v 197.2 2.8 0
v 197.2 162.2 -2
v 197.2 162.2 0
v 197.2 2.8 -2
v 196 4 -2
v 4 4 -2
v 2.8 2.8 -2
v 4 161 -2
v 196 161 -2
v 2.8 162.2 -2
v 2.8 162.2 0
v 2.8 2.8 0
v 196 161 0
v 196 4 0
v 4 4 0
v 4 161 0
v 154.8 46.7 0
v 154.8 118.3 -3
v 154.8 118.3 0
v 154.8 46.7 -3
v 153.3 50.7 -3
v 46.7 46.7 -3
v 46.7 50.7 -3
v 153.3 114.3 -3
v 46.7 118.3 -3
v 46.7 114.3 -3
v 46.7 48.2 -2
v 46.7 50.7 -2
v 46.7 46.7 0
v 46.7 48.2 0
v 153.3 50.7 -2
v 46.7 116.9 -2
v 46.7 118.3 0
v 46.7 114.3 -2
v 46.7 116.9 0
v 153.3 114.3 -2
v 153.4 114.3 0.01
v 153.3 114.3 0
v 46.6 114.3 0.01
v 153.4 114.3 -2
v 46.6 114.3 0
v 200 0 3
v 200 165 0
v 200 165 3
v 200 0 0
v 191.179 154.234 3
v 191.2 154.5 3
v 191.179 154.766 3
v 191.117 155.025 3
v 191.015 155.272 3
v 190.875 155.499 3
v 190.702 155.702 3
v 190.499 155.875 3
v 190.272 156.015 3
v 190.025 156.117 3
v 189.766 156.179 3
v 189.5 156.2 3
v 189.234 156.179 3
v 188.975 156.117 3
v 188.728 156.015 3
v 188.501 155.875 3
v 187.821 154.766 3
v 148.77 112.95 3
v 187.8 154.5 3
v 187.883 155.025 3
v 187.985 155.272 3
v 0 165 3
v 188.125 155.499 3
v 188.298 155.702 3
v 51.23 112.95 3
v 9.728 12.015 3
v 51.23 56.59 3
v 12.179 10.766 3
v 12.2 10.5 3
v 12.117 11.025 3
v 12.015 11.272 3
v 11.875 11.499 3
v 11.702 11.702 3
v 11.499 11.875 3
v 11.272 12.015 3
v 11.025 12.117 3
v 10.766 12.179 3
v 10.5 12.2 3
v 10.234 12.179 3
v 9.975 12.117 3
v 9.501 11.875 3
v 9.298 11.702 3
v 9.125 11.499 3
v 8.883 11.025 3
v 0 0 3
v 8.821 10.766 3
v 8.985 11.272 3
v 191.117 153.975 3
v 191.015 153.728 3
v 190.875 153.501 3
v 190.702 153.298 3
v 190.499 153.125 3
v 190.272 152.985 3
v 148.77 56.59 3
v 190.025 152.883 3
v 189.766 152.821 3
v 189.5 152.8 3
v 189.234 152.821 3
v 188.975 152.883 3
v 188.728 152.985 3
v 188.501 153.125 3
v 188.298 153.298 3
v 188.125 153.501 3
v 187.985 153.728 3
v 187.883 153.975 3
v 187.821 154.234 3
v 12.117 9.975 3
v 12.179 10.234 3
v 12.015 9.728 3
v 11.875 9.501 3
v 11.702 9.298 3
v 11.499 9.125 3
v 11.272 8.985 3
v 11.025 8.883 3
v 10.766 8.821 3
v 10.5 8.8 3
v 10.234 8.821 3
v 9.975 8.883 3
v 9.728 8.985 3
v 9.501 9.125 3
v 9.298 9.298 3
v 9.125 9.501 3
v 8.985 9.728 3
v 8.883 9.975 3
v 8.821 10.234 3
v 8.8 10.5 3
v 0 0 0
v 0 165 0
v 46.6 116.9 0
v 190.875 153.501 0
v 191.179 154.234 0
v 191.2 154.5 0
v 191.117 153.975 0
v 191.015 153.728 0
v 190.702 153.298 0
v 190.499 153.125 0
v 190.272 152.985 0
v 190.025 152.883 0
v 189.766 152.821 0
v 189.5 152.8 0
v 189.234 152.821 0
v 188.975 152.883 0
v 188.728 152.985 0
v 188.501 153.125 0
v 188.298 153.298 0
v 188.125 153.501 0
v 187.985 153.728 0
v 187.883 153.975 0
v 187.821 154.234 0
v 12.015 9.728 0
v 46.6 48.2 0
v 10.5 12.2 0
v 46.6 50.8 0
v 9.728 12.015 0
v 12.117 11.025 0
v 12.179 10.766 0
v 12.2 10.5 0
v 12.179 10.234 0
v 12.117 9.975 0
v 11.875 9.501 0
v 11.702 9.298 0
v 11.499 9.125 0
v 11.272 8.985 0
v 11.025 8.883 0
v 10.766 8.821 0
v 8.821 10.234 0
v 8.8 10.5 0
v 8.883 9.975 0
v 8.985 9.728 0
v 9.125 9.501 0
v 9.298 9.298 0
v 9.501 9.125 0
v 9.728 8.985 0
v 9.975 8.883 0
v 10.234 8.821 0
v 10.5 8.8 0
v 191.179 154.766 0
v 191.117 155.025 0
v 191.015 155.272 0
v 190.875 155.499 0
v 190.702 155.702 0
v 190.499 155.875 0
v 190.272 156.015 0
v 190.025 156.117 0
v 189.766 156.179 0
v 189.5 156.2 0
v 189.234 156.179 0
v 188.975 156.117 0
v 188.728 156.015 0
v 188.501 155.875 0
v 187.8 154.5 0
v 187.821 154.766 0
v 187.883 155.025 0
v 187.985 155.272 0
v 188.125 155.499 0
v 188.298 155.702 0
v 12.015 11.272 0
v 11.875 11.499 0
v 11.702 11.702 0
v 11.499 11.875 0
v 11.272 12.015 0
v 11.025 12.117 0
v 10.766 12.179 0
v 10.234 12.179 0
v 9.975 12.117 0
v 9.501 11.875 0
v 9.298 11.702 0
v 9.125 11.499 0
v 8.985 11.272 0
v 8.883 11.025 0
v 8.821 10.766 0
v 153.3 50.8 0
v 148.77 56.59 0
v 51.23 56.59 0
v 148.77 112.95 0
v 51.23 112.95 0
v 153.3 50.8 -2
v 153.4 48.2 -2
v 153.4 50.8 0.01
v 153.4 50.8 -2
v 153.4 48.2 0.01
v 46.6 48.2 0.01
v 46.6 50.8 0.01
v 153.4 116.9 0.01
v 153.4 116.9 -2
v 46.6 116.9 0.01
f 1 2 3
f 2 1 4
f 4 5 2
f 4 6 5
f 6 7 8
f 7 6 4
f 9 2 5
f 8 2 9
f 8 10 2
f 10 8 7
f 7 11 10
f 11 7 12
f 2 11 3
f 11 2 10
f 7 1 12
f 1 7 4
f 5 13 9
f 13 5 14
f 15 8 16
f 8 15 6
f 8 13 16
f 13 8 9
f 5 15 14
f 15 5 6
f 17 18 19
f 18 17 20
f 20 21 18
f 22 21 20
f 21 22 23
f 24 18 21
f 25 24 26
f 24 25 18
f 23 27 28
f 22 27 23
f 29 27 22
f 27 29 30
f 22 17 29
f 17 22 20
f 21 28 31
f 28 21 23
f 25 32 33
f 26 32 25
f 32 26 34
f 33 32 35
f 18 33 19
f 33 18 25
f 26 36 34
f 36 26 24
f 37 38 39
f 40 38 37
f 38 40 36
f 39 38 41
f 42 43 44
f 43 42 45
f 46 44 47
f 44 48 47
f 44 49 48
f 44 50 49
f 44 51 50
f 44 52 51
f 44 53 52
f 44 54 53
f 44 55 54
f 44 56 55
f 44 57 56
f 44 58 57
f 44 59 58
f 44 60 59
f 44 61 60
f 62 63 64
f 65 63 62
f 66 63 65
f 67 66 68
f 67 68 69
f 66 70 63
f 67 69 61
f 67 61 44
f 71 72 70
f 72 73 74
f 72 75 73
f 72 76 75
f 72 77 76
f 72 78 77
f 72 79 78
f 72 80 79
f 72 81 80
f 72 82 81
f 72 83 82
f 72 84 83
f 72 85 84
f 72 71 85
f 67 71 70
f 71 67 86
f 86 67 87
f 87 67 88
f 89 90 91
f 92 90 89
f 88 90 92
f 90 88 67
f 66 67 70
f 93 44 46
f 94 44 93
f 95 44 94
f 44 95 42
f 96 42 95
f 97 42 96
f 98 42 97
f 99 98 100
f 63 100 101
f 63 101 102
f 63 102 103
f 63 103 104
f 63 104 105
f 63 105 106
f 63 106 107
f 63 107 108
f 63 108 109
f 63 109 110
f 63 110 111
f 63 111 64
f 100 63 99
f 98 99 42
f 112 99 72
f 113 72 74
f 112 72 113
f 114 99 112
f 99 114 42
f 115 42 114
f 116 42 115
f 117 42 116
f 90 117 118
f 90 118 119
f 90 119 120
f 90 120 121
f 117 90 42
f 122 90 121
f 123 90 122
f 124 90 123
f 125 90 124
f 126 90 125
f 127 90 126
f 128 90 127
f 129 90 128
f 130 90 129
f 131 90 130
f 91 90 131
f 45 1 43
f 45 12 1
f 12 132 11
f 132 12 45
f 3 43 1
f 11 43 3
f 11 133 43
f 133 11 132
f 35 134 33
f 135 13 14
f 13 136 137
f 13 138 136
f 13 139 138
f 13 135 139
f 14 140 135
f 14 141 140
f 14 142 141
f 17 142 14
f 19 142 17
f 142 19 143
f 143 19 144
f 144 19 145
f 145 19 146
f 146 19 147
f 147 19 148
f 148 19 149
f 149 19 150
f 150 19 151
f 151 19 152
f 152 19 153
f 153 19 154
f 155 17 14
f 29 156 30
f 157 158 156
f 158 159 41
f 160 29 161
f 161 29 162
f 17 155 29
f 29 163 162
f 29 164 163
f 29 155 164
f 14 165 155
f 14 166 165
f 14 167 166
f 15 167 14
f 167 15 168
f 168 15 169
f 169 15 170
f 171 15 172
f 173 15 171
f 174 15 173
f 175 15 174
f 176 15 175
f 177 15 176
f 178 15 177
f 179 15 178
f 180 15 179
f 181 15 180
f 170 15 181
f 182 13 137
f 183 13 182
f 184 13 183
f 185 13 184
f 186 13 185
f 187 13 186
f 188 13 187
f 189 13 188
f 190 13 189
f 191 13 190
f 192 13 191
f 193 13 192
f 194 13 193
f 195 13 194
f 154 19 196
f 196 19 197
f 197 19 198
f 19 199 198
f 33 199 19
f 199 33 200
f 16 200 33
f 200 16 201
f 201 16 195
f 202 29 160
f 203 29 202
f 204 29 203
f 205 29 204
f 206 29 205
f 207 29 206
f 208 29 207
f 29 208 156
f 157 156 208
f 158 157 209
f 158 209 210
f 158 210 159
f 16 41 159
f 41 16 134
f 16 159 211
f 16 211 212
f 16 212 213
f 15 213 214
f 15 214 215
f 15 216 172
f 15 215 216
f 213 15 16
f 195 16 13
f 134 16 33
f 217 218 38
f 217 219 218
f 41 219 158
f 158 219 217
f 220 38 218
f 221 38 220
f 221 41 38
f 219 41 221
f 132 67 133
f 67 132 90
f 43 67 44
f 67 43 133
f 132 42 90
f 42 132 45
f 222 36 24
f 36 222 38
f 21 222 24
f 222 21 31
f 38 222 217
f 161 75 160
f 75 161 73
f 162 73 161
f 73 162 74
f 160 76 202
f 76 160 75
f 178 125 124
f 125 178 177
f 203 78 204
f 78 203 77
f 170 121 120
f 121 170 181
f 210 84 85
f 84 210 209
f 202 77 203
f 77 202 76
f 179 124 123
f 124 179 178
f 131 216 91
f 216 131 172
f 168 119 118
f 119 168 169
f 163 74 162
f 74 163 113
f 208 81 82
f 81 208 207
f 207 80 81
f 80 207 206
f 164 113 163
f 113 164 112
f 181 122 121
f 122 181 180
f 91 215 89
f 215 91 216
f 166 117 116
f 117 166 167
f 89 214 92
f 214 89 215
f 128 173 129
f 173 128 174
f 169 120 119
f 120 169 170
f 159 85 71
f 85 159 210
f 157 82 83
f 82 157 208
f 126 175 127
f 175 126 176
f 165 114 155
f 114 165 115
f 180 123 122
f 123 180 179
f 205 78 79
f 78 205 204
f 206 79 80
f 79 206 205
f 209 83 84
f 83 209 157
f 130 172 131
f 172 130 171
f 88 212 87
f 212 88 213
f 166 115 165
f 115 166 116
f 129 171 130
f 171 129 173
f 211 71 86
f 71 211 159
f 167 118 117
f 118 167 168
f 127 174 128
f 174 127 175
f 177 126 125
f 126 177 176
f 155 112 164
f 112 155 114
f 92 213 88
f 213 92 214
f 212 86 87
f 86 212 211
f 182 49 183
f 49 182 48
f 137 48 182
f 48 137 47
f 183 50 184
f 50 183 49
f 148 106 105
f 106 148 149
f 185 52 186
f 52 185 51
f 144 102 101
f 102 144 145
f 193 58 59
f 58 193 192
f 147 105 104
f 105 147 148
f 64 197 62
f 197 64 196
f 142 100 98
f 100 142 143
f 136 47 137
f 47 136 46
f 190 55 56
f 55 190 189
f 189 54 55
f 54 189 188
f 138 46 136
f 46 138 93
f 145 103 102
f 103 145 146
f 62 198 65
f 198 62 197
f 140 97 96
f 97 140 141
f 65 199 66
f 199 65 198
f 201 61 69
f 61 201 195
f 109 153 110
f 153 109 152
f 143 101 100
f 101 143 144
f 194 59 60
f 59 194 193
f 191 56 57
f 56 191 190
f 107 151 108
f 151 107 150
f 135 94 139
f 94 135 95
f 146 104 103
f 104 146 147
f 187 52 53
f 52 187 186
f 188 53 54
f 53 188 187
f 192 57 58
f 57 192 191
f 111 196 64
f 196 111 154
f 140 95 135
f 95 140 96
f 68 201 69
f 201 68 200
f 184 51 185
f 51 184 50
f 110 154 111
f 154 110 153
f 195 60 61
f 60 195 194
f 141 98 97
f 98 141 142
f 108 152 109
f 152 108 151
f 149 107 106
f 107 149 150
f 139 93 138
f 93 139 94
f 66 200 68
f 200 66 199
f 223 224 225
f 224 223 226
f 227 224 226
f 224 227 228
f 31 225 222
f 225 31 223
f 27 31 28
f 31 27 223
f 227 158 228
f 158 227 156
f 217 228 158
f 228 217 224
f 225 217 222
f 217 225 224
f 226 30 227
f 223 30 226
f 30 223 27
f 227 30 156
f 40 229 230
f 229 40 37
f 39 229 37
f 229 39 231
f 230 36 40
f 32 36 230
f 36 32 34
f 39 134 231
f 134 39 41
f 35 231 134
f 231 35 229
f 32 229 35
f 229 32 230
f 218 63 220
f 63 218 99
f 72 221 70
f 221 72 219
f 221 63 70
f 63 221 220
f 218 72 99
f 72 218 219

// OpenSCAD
// =============================================================================
// DOA Flat Enclosure - LID
// =============================================================================
//
// Mates with doa_enclosure_body.scad. Drops onto the body's perimeter snap
// ledge and is retained by two M3 screws into the body's diagonal corner
// bosses (front-left and back-right).
//
// Houses a Waveshare ESP32-S3-Touch-LCD-4.3 mounted glass-side up, with
// cables (UART/RS-485/power) feeding down into the enclosure interior.
//
//   PCB outline ............... 106.00 x 68.00 mm
//   Glass ..................... 106.10 x 67.80 mm (≈ flush with PCB)
//   Active area ............... 95.54 x 54.36 mm (800x480)
//   Stack depth ............... 8.80 mm  (glass top -> PCB bottom)
//   Mounting holes ............ 98.00 x 60.00 mm c-to-c, 4 mm edge inset,
//                               2.28 mm dia (measured, M2 clearance)
//   Active area offset ........ 5.23 mm left, 5.33 mm right,
//                               4.35 mm top, 9.09 mm bottom (ASYMMETRIC —
//                               FPC ribbon side has a fatter black frame)
//
// Retention strategy:
//   Solid lid with an active-area window cut through for the screen.
//   Two slide-in rails on the long sides form channels that capture the
//   PCB edges. The display slides in from the front short end (low-Y)
//   and a stop wall at the back short end (high-Y) prevents over-insertion.
//   A small detent bump near the entry provides friction retention.
//   Front short end stays open for cable routing.
//
// Print orientation: lid flat on bed, top face up (lip hangs down).
// =============================================================================

$fn = 40;

// =============================================================================
// BODY-DERIVED CONSTANTS  --  keep in sync with doa_enclosure_body.scad
// =============================================================================

wall       = 2.5;
interior_w = 195;
interior_d = 160;
interior_h = 52;      // matches body

enc_w = interior_w + 2*wall;    // 200 mm
enc_d = interior_d + 2*wall;    // 165 mm

ledge_drop = 2;       // distance from wall top down to top of body ledge

// Body's two diagonal M3 retention bosses (interior coords, from body SCAD)
lid_boss_pos = [
    [8,                8],                  // front-left
    [interior_w - 8,   interior_d - 8]      // back-right
];
m3_clear_d = 3.4;

// =============================================================================
// LID GEOMETRY
// =============================================================================

lid_t   = 3.0;    // top plate thickness
lip_t   = 1.2;    // downward lip thickness
lip_clr = 0.3;    // clearance between lip outside face and interior wall
lip_h   = ledge_drop;    // lip drops 2 mm from lid underside to seat on ledge

// =============================================================================
// WAVESHARE ESP32-S3-TOUCH-LCD-4.3 PARAMETERS
// (all values from ESP32-S3-Touch-LCD-4.3-Sch.pdf page 3, unit: mm)
// =============================================================================

ws_pcb_w      = 106.00;
ws_pcb_d      =  68.00;
ws_glass_w    = 106.10;
ws_glass_d    =  67.80;
ws_active_w   =  95.54;
ws_active_d   =  54.36;

// Active area offsets from PCB bottom-left corner, in PCB-local coords.
// Vertical asymmetry: 4.35 top vs 9.09 bottom — the long black frame is on
// the ribbon (bottom) edge. If you rotate the display so the RS-485 J1 port
// faces a specific enclosure edge, the asymmetry rotates with it.
ws_active_off_x = 5.23;   // from left PCB edge  (106.10 - 95.54 - 5.33)
ws_active_off_y = 9.09;   // from "bottom" PCB edge (ribbon side)

// Factory mounting holes — not used for slide-in retention, kept for reference.
// ws_hole_inset = 4.00;
// ws_hole_cx    = 98.00;
// ws_hole_cy    = 60.00;
// ws_hole_measured_d = 2.28;

// Slide-in rail parameters
ws_rail_clr    = 0.3;     // clearance between rail channel and PCB edge
ws_rail_wall   = 1.5;     // rail outer wall thickness
ws_rail_lip    = 2.5;     // inward lip width that captures PCB edge
ws_rail_h      = 3.0;     // rail height below lid (total channel depth)
ws_pcb_t       = 1.6;     // PCB thickness (channel slots PCB into this layer)
ws_rail_chan_h  = ws_pcb_t + 0.4;  // channel slot height (PCB + clearance)

// Stop wall at back end (high-Y) prevents over-insertion
ws_stop_wall   = 1.5;     // stop wall thickness

// Detent bump near entry for friction retention
ws_detent_h    = 0.4;     // bump height into channel
ws_detent_w    = 8.0;     // bump width along rail
ws_detent_pos  = 10.0;    // distance from entry end (low-Y PCB edge)

// Active area window (cut all the way through for the screen)
ws_win_margin  = 1.0;     // margin around active area
ws_win_w = ws_active_w + 2*ws_win_margin;   // 97.54
ws_win_d = ws_active_d + 2*ws_win_margin;   // 56.36

// Orient the PCB so its long axis runs along the lid's long axis (X).
// Centered on the lid footprint. If you want the RS-485 port (PCB's long
// "bottom" edge) to face a specific enclosure edge, rotate/translate here.
ws_pcb_origin_x = (enc_w - ws_pcb_w) / 2;   // 44.5
ws_pcb_origin_y = (enc_d - ws_pcb_d) / 2;   // 43.5

// =============================================================================
// RENDER
// =============================================================================

difference() {
    union() {
        top_plate();
        lid_lip();
        display_slide_rails();
        display_stop_wall();
        display_detent_bumps();
    }
    body_corner_clearances();
    display_window();
    display_rail_channels();
}

// Uncomment to visualize display placement before printing:
 //%preview_waveshare();

// =============================================================================
// MODULES
// =============================================================================

module top_plate() {
    cube([enc_w, enc_d, lid_t]);
}

// Downward lip that slots inside the body's interior walls and rests on the
// top face of the perimeter snap ledge.
module lid_lip() {
    lip_outer_w = interior_w - 2*lip_clr;
    lip_outer_d = interior_d - 2*lip_clr;

    translate([wall + lip_clr, wall + lip_clr, -lip_h])
    difference() {
        cube([lip_outer_w, lip_outer_d, lip_h + 0.01]);
        translate([lip_t, lip_t, -0.1])
            cube([lip_outer_w - 2*lip_t,
                  lip_outer_d - 2*lip_t,
                  lip_h + 0.3]);
    }
}

// M3 clearance holes through the lid at the body's two diagonal bosses.
module body_corner_clearances() {
    for (pos = lid_boss_pos) {
        translate([wall + pos[0], wall + pos[1], -0.1])
            cylinder(d=m3_clear_d, h=lid_t + 0.2);
    }
}

// Slide-in rails: two solid bars on the long (X) sides of the display area.
// Each rail runs the full PCB length plus stop wall. The inward lip that
// captures the PCB edge is cut out by display_rail_channels() below.
module display_slide_rails() {
    rail_len = ws_pcb_w + 2*ws_rail_clr + ws_stop_wall;

    for (side = [0, 1]) {
        y_off = (side == 0)
            ? ws_pcb_origin_y - ws_rail_clr - ws_rail_wall
            : ws_pcb_origin_y + ws_pcb_d + ws_rail_clr;
        translate([ws_pcb_origin_x - ws_rail_clr,
                   y_off,
                   -ws_rail_h])
            cube([rail_len,
                  ws_rail_wall,
                  ws_rail_h + 0.01]);

        // Inward lip — extends from the rail wall toward PCB center
        translate([ws_pcb_origin_x - ws_rail_clr,
                   (side == 0)
                       ? ws_pcb_origin_y - ws_rail_clr
                       : ws_pcb_origin_y + ws_pcb_d + ws_rail_clr - ws_rail_lip,
                   -ws_rail_h])
            cube([rail_len,
                  ws_rail_lip,
                  ws_rail_h + 0.01]);
    }
}

// Channel slots cut into the rails — the PCB edges slide through here.
// The channel is at the top of the rail (against the lid underside) so the
// PCB hangs at the correct depth. Below the channel, the lip supports the PCB.
module display_rail_channels() {
    // Channel runs the full rail length minus the stop wall
    chan_len = ws_pcb_w + 2*ws_rail_clr + 0.2;

    for (side = [0, 1]) {
        y_off = (side == 0)
            ? ws_pcb_origin_y - ws_rail_clr
            : ws_pcb_origin_y + ws_pcb_d + ws_rail_clr - ws_rail_lip;
        translate([ws_pcb_origin_x - ws_rail_clr - 0.1,
                   y_off,
                   -ws_rail_chan_h])
            cube([chan_len,
                  ws_rail_lip + 0.1,
                  ws_rail_chan_h + 0.01]);
    }
}

// Stop wall at the back short end (high-X) prevents over-insertion.
// The display slides in from the front (low-X) end.
module display_stop_wall() {
    stop_x = ws_pcb_origin_x + ws_pcb_w + ws_rail_clr;
    translate([stop_x,
               ws_pcb_origin_y - ws_rail_clr - ws_rail_wall,
               -ws_rail_h])
        cube([ws_stop_wall,
              ws_pcb_d + 2*ws_rail_clr + 2*ws_rail_wall,
              ws_rail_h + 0.01]);
}

// Small detent bumps on each rail's inner lip near the entry end.
// These provide friction retention so the display doesn't slide out.
module display_detent_bumps() {
    for (side = [0, 1]) {
        y_pos = (side == 0)
            ? ws_pcb_origin_y - ws_rail_clr + 0.1
            : ws_pcb_origin_y + ws_pcb_d + ws_rail_clr - 0.1;
        // Bump sits inside the channel, protruding inward
        translate([ws_pcb_origin_x + ws_detent_pos,
                   y_pos,
                   -ws_rail_chan_h/2])
            rotate([0, 0, 0])
            scale([1, (side == 0) ? -1 : 1, 1])
            // Half-cylinder bump
            rotate([0, 90, 0])
            cylinder(d=ws_detent_h*2, h=ws_detent_w, $fn=20);
    }
}

// Active area window — cuts through the lid plate.
module display_window() {
    win_cx = ws_pcb_origin_x + ws_active_off_x + ws_active_w/2;
    win_cy = ws_pcb_origin_y + ws_active_off_y + ws_active_d/2;
    translate([win_cx - ws_win_w/2,
               win_cy - ws_win_d/2,
               -0.1])
        cube([ws_win_w, ws_win_d, lid_t + 0.2]);
}

// =============================================================================
// PREVIEW (display placement sanity check)
// =============================================================================

module preview_waveshare() {
    // PCB (dark blue) — hangs below the lid plate in the rail channels
    color("navy", 0.5)
    translate([ws_pcb_origin_x, ws_pcb_origin_y, -ws_pcb_t])
        cube([ws_pcb_w, ws_pcb_d, ws_pcb_t]);

    // LCD back stack (grey translucent)
    color("grey", 0.4)
    translate([ws_pcb_origin_x, ws_pcb_origin_y, -8.80])
        cube([ws_pcb_w, ws_pcb_d, 8.80 - ws_pcb_t - 0.5]);

    // Glass (cyan translucent)
    color("cyan", 0.35)
    translate([ws_pcb_origin_x - (ws_glass_w - ws_pcb_w)/2,
               ws_pcb_origin_y + (ws_pcb_d - ws_glass_d)/2,
               lid_t - 0.1])
        cube([ws_glass_w, ws_glass_d, 0.6]);

    // Active area (green)
    color("lime", 0.7)
    translate([ws_pcb_origin_x + ws_active_off_x,
               ws_pcb_origin_y + ws_active_off_y,
               lid_t + 0.5])
        cube([ws_active_w, ws_active_d, 0.3]);

    // Slide direction arrow (red) — shows insertion direction
    color("red", 0.8)
    translate([ws_pcb_origin_x - 15, ws_pcb_origin_y + ws_pcb_d/2, -ws_pcb_t/2])
        rotate([0, 90, 0])
        cylinder(d=2, h=12, $fn=12);
}

// =============================================================================
// DIMENSION CHECKS
// =============================================================================

echo("==========================================================");
echo("DOA FLAT ENCLOSURE - LID (SLIDE-IN)");
echo("==========================================================");
echo(str("Lid outer: ", enc_w, " x ", enc_d, " x ", lid_t, " mm"));
echo(str("Lip drop: ", lip_h, " mm (seats on body ledge)"));
echo(str("Display window: ", ws_win_w, " x ", ws_win_d,
    " mm (active area + ", ws_win_margin, " mm margin)"));
echo(str("Slide rails: lip=", ws_rail_lip, " mm, channel=",
    ws_rail_chan_h, " mm (PCB ", ws_pcb_t, " + 0.4 clr)"));
echo(str("Stop wall: ", ws_stop_wall, " mm at high-X end"));
echo(str("Detent bumps: ", ws_detent_h, " mm x ", ws_detent_w,
    " mm, ", ws_detent_pos, " mm from entry"));
